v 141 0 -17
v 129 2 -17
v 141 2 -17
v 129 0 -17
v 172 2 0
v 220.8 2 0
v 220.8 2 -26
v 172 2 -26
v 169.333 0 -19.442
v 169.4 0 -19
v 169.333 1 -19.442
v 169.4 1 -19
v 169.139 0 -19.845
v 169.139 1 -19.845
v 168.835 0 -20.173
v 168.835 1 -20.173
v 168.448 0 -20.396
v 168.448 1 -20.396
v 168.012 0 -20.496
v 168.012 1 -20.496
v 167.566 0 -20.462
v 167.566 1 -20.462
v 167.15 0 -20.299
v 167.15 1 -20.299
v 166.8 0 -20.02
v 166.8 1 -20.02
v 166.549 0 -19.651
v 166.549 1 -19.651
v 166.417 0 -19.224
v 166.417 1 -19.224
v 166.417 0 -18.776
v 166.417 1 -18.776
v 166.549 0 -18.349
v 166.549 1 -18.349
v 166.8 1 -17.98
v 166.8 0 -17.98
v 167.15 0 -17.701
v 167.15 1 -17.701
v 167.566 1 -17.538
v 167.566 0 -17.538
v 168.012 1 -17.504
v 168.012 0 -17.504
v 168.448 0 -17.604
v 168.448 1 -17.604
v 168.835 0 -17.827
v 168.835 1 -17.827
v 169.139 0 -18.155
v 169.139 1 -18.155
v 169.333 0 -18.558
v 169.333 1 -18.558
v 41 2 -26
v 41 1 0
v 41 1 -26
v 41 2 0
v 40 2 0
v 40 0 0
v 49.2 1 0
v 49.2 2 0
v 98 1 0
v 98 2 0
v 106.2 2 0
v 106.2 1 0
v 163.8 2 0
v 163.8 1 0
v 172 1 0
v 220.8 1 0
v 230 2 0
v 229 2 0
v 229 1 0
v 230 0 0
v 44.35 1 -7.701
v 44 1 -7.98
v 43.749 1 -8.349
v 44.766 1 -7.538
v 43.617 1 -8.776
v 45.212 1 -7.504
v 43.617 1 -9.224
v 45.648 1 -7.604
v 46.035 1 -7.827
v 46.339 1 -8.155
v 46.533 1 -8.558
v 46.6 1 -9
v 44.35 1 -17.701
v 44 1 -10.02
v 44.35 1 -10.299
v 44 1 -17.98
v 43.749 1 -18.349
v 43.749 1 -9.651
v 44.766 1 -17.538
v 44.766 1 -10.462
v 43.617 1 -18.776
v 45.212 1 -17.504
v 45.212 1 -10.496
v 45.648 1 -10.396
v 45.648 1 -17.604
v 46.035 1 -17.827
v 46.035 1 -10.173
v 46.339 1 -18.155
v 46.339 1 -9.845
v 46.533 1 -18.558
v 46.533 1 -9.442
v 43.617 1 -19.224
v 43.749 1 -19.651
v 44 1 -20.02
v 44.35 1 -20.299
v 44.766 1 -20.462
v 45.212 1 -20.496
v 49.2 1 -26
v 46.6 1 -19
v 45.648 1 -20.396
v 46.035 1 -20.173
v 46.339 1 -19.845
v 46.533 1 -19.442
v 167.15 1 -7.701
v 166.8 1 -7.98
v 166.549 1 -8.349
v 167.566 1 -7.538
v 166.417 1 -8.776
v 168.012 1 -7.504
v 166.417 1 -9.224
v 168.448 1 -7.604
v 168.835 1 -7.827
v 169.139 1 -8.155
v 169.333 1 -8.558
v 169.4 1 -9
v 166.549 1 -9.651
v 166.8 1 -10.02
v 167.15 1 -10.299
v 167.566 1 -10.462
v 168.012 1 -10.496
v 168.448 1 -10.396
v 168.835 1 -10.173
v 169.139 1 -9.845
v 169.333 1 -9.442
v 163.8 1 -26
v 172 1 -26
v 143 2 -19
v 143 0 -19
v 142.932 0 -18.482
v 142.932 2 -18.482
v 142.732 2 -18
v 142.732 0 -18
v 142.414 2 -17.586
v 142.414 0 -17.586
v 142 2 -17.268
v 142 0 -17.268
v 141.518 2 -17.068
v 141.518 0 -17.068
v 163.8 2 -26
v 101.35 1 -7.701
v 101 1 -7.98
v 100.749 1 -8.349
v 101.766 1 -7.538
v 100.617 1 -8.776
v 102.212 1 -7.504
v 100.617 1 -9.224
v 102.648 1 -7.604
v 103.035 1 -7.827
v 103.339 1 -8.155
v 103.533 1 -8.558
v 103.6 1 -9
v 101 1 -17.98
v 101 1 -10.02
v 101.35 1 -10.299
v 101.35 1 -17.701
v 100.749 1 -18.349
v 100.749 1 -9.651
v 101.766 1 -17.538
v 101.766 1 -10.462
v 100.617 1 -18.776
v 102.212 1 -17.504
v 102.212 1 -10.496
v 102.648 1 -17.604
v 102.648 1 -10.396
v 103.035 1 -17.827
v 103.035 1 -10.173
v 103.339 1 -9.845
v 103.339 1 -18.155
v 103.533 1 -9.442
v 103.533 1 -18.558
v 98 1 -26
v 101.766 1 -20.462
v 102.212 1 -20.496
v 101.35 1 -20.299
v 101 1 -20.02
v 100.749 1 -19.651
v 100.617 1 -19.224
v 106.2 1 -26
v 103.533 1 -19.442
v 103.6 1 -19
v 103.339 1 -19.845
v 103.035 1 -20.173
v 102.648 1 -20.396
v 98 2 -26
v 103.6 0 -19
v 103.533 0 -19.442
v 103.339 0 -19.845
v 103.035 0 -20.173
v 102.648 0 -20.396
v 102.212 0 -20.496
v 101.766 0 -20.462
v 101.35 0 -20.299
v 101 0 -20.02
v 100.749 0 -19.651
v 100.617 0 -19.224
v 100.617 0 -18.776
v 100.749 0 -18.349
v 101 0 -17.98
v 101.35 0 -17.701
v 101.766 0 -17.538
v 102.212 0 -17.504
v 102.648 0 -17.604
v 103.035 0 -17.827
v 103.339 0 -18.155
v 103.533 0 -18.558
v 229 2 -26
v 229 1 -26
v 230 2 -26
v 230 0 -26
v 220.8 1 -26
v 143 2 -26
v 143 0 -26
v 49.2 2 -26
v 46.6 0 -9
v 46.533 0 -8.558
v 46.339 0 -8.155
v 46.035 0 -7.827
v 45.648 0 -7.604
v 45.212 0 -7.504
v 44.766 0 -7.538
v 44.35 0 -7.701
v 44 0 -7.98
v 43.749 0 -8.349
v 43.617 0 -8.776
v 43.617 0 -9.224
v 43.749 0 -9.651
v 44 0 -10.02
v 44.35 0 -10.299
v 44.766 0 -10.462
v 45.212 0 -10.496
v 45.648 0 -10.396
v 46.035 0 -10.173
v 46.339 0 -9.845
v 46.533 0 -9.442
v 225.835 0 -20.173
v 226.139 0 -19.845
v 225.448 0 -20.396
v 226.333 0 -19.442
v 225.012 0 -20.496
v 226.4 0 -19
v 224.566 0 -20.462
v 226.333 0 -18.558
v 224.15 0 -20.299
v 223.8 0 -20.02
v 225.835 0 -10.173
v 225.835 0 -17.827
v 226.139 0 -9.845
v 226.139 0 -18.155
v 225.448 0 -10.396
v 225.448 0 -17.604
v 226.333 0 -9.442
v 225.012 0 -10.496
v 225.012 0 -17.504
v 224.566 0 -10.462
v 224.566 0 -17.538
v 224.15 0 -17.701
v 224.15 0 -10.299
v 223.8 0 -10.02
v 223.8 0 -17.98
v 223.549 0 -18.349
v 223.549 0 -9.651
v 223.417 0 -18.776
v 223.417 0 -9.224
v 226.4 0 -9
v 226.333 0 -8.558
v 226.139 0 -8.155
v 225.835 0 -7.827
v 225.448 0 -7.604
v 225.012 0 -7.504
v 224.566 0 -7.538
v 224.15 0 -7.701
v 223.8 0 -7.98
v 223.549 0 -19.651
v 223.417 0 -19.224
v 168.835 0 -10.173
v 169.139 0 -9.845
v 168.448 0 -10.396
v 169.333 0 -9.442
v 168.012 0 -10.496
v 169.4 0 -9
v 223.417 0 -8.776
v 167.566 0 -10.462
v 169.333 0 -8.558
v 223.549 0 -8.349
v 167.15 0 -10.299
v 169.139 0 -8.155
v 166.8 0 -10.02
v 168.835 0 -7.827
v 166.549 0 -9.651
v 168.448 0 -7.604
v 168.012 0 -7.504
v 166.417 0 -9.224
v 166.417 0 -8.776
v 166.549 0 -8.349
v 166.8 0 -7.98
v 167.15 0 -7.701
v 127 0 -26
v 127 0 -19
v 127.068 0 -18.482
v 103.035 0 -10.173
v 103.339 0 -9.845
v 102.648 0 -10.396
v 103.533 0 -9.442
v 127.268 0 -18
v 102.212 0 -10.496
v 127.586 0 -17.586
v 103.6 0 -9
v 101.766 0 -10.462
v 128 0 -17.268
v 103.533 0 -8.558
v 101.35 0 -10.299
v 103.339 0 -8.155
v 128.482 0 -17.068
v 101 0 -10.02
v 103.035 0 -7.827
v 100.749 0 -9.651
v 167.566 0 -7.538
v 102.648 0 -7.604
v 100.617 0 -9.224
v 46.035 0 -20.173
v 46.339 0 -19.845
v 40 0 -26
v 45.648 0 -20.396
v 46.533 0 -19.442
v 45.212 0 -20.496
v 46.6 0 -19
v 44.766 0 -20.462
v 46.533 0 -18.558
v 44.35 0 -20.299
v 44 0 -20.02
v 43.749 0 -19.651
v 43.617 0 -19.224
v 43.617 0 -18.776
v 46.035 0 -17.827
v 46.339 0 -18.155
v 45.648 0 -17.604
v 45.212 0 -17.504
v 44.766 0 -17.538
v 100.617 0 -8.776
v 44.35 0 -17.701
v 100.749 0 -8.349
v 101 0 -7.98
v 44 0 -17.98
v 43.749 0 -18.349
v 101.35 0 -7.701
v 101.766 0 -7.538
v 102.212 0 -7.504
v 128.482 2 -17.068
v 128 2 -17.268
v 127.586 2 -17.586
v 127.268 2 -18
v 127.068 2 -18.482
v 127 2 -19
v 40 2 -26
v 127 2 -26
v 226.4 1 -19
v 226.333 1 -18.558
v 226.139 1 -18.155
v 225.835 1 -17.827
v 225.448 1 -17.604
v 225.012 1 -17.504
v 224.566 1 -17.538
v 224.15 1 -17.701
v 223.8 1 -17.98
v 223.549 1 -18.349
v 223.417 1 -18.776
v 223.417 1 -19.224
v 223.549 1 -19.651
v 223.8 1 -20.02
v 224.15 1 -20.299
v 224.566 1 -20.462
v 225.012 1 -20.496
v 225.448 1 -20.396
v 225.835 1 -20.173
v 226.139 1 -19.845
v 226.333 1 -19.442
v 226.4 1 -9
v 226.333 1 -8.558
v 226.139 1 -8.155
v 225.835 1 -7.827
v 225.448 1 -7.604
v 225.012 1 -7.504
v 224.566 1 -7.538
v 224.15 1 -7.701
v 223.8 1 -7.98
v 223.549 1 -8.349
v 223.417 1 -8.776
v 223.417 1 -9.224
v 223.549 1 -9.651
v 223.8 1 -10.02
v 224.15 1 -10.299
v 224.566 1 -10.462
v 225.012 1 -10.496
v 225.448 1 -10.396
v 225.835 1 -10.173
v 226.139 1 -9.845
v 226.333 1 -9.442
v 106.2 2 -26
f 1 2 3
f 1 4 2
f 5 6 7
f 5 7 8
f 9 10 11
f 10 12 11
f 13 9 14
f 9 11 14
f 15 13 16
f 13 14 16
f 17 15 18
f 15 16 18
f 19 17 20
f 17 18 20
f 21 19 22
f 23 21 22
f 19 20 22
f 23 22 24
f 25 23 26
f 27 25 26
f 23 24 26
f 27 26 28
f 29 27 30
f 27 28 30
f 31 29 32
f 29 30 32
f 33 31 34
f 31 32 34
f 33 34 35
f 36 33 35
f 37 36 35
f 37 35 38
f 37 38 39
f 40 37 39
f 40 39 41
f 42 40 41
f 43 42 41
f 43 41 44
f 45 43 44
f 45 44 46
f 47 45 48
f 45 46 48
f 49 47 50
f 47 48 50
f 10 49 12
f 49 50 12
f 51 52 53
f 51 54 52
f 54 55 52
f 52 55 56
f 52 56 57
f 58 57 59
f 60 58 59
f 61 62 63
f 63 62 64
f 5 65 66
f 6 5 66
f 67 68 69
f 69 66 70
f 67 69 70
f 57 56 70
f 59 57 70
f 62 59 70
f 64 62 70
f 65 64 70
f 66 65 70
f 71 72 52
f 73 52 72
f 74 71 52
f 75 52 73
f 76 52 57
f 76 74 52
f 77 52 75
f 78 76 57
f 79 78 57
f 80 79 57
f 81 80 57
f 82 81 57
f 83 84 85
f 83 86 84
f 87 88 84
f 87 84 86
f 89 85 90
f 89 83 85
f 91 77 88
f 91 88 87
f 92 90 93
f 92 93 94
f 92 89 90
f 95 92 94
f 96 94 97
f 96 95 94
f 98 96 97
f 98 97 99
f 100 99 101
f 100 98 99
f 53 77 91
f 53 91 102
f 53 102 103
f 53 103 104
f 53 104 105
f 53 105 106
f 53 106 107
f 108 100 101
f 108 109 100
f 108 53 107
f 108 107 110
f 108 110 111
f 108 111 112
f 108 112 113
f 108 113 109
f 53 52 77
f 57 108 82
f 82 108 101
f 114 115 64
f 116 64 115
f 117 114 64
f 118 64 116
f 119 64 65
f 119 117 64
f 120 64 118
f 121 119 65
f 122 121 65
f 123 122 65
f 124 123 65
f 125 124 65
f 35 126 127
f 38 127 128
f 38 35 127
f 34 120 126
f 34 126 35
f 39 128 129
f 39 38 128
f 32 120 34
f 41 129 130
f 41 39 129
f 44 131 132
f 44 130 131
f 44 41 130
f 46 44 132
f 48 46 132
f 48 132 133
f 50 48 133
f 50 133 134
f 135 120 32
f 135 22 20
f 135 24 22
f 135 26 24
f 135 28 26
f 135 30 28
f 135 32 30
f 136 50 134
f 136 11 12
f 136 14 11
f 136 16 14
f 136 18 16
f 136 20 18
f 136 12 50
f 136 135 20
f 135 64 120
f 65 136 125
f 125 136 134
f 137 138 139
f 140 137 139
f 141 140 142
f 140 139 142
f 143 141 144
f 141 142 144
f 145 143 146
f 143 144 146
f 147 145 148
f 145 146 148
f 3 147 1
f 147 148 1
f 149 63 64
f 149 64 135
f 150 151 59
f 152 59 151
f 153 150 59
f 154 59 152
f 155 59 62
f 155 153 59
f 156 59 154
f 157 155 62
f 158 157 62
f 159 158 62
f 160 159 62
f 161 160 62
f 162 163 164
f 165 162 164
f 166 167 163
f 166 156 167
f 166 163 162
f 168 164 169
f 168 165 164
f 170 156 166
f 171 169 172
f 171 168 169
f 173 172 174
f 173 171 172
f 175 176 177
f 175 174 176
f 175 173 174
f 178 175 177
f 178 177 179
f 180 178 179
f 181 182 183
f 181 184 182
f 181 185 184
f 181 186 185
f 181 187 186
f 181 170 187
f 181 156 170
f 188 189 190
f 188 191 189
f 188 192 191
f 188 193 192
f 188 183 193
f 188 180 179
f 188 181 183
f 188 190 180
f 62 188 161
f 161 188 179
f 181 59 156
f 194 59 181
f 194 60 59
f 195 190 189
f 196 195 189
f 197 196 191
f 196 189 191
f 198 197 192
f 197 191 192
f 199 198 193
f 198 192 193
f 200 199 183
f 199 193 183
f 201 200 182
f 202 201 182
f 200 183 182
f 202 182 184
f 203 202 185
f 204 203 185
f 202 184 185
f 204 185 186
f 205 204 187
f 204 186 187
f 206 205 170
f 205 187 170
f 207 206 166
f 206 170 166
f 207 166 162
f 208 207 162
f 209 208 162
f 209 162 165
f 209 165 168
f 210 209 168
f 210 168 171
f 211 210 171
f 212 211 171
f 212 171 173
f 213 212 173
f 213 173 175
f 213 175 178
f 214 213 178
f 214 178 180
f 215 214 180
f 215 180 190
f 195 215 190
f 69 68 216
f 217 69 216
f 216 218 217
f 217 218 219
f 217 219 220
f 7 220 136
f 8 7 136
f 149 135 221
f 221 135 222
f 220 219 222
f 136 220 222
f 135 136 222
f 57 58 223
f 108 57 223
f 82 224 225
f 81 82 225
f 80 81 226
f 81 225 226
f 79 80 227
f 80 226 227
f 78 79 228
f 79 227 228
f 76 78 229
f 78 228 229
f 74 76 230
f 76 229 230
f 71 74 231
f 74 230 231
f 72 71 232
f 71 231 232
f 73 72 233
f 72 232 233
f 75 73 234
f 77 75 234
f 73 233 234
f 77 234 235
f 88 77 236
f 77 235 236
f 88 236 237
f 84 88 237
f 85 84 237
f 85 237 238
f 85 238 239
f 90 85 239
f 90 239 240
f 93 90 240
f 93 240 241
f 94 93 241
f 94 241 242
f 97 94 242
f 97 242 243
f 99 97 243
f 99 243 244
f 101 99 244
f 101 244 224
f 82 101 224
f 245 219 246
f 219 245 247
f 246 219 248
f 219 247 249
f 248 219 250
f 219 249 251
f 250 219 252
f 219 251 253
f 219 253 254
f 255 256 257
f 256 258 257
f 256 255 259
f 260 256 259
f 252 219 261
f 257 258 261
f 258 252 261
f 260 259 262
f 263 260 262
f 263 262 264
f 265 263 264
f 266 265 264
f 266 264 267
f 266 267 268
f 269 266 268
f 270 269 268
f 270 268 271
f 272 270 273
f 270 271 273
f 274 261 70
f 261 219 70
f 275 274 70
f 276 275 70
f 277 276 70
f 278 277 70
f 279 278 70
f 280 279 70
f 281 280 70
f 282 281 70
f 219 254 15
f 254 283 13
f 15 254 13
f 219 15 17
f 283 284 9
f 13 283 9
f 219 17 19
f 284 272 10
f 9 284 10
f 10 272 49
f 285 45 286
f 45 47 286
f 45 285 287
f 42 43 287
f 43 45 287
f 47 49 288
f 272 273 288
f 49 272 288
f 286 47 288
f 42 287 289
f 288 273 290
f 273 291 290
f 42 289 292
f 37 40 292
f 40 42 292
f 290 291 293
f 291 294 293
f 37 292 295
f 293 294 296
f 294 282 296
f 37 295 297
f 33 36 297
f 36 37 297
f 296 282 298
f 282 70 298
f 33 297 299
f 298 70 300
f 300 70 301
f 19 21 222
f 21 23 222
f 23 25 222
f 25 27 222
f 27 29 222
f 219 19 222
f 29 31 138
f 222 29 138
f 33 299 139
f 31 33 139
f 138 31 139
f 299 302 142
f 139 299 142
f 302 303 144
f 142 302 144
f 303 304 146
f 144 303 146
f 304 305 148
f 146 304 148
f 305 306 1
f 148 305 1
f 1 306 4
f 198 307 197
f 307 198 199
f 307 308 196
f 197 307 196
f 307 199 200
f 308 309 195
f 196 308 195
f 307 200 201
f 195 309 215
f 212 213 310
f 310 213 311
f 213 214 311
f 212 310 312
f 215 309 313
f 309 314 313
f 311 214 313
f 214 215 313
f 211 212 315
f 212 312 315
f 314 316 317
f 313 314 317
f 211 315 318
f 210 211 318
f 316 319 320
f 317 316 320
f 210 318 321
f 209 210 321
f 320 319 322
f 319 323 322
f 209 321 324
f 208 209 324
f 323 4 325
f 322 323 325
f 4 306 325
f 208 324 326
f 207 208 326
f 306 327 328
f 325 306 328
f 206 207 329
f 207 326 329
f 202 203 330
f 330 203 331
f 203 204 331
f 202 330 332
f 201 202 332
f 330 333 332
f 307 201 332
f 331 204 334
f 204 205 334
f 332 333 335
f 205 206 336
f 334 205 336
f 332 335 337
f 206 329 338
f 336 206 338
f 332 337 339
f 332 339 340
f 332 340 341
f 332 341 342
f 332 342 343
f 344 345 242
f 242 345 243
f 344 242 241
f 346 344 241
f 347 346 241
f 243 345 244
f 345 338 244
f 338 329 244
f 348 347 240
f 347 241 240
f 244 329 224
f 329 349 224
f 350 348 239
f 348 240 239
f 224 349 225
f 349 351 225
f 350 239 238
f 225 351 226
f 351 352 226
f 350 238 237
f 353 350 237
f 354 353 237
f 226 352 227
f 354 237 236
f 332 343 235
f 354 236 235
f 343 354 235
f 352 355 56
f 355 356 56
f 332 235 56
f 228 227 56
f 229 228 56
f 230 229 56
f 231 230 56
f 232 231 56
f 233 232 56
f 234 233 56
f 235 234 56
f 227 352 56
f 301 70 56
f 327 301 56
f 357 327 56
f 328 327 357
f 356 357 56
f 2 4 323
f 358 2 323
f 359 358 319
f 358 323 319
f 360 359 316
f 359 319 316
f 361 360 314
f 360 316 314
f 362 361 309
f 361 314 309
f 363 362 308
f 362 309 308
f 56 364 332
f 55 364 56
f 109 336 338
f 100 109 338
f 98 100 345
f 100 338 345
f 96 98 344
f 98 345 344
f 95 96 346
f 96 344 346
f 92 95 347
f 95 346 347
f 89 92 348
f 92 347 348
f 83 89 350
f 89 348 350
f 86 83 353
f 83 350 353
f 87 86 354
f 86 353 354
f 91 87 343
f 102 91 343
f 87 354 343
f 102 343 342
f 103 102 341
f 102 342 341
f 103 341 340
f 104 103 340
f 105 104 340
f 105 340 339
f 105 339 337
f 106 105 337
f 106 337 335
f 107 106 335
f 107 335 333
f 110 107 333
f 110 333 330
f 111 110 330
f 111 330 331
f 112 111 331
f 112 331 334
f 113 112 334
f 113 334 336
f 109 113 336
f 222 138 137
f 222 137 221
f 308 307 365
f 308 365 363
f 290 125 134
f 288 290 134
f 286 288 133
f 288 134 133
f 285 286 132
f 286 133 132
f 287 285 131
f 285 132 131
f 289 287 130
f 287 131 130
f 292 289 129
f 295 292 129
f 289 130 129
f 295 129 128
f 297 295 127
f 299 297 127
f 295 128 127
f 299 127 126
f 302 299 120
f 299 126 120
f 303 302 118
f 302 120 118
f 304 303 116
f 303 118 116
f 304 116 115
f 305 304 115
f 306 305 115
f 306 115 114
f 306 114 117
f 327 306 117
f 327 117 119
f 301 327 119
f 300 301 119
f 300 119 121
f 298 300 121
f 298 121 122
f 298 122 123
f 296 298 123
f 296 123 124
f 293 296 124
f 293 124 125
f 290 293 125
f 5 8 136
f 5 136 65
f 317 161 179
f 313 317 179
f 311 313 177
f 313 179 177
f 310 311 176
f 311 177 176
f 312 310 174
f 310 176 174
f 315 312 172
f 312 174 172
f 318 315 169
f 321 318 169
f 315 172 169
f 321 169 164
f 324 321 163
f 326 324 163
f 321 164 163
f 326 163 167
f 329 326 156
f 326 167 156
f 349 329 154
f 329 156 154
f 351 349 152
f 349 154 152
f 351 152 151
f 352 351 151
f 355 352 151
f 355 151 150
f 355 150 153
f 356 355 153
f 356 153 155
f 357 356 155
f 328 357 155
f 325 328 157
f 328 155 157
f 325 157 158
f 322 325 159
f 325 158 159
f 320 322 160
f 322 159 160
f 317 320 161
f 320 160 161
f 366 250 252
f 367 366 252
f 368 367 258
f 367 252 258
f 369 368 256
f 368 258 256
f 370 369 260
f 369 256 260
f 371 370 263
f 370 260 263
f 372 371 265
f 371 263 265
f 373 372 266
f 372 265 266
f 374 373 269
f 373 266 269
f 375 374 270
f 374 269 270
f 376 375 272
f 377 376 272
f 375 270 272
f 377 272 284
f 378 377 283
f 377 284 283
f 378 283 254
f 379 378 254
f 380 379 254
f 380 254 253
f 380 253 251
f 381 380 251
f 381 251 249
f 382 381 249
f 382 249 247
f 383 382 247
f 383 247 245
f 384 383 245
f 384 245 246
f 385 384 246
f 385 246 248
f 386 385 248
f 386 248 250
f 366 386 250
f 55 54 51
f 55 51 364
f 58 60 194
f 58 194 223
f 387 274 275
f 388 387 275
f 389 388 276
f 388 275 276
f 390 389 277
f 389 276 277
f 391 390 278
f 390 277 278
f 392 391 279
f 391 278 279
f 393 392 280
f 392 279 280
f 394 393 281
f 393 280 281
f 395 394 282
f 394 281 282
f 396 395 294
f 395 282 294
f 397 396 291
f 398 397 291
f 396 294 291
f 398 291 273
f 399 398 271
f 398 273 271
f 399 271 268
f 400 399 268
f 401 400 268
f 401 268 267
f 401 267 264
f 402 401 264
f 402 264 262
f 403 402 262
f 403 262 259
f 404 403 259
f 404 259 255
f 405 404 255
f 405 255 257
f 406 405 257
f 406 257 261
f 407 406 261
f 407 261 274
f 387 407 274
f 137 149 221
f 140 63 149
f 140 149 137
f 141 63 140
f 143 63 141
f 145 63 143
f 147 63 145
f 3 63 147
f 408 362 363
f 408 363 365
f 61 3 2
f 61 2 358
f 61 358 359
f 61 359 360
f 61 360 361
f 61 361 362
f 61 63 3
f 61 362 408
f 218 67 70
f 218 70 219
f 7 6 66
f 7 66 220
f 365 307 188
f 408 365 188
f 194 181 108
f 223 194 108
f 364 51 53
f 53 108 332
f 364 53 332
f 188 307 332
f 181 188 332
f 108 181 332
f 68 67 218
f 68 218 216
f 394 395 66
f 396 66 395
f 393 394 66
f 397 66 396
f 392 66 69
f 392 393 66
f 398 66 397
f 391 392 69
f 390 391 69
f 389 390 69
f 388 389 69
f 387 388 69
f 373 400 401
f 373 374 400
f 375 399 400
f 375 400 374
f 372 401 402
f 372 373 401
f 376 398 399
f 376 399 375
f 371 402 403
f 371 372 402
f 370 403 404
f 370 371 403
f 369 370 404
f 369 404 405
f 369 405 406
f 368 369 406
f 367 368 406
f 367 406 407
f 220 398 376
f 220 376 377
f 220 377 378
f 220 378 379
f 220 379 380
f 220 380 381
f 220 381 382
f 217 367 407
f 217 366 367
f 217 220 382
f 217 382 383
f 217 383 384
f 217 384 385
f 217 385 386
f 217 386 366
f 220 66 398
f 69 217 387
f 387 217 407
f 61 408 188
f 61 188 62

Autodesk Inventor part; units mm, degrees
ref_plane "YZ Plane" through (0, 0, 0) normal (1, 0, 0) x (0, 1, 0)
ref_plane "XZ Plane" through (0, 0, 0) normal (0, 1, 0) x (-1, 0, 0)
ref_plane "XY Plane" through (0, 0, 0) normal (0, 0, 1) x (1, 0, 0)
sketch "스케치1" plane through (0, 0, 0) normal (0, 1, 0) x (-1, 0, 0)
  line L0 (0, 0) -> (-270, 0)
  line L1 (-270, 0) -> (-270, -26)
  line L2 (-270, -26) -> (0, -26)
  line L3 (0, -26) -> (0, 0)
  dimension "d0" = 270
  dimension "d1" = 26
extrude "돌출1" add sketch "스케치1" along normal blind 2
sketch "스케치2" plane through (0, 2, 0) normal (0, 1, 0) x (1, 0, 0)
  line L0 (0, 0) -> (270, 0) projected
  line L1 (270, 0) -> (270, 26) projected
  line L2 (270, 26) -> (0, 26) projected
  line L3 (0, 26) -> (0, 0) projected
  line L4 (1, 26) -> (1, 0)
  line L5 (9.2, 26) -> (9.2, 0)
  line L6 (269, 26) -> (269, 0)
  line L7 (260.8, 26) -> (260.8, 0)
  line L8 (0, 0) -> (270, 0) projected
  line L9 (270, 26) -> (0, 26) projected
  line L10 (260.8, 0) -> (269, 0)
  line L11 (260.8, 26) -> (269, 26)
  line L12 (0, 0) -> (40, 0)
  line L13 (40, 0) -> (41, 0)
  line L14 (41, 0) -> (41, 26)
  line L15 (41, 0) -> (49.2, 0)
  line L16 (49.2, 0) -> (49.2, 26)
  line L17 (270, 0) -> (270, 0)
  line L18 (270, 0) -> (229, 0)
  line L19 (229, 0) -> (220.8, 0)
  line L20 (220.8, 0) -> (220.8, 26)
  line L21 (229, 0) -> (229, 26)
  line L22 (229, 26) -> (220.8, 26)
  line L23 (41, 26) -> (49.2, 26)
  line L24 (9.2, 0) -> (1, 0)
  line L25 (9.2, 26) -> (1, 26)
  line L26 (1, 0) -> (1, 26)
  dimension "d19" = 8.2
  dimension "d20" = 1
  dimension "d21" = 8.2
  dimension "d22" = 40
  dimension "d23" = 1
  dimension "d24" = 8.2
  dimension "d26" = 8.2
  dimension "d29" = 41
extrude "돌출3" cut sketch "스케치2" against normal blind 1 contours L4 L2 L5 L0 | L14 L2 L16 L0 | L20 L2 L21 L0 | L7 L2 L6 L0
sketch "스케치5" plane through (0, 0, 0) normal (0, -1, 0) x (1, 0, 0)
  line L0 (0, 0) -> (270, 0) projected
  line L1 (0, -26) -> (0, 0) projected
  line L2 (270, -26) -> (0, -26) projected
  line L3 (270, 0) -> (270, -26) projected
  line L4 (0, 0) -> (270, 0) projected
  line L5 (270, -26) -> (0, -26) projected
  line L6 (127, -26) -> (127, -19)
  line L7 (129, -17) -> (141, -17)
  line L8 (143, -19) -> (143, -26)
  arc A0 (129, -17) -> (127, -19) centre (129, -19) ccw
  arc A1 (143, -19) -> (141, -17) centre (141, -19) ccw
  point P0 (127, -17)
  point P1 (143, -17)
  dimension "d39" = 9
  dimension "d40" = 16
  dimension "d70" = 127
  dimension "d71" = 2
  dimension "d72" = 2
sketch "스케치6" plane through (0, 0, 0) normal (0, -1, 0) x (1, 0, 0)
  line L0 (1, -26) -> (9.2, -26) projected
  line L1 (1, 0) -> (1, -26) projected
  line L2 (9.2, 0) -> (1, 0) projected
  line L3 (9.2, -26) -> (9.2, 0) projected
  line L4 (49.2, 0) -> (41, 0) projected
  line L5 (49.2, -26) -> (49.2, 0) projected
  line L6 (41, -26) -> (49.2, -26) projected
  line L7 (41, 0) -> (41, -26) projected
  line L8 (220.8, -26) -> (229, -26) projected
  line L9 (220.8, 0) -> (220.8, -26) projected
  line L10 (229, 0) -> (220.8, 0) projected
  line L11 (229, -26) -> (229, 0) projected
  line L12 (269, -26) -> (269, 0) projected
  line L13 (260.8, -26) -> (269, -26) projected
  line L14 (260.8, 0) -> (260.8, -26) projected
  line L15 (269, 0) -> (260.8, 0) projected
  circle A0 centre (5.1, -9) radius 1.5
  circle A1 centre (5.1, -19) radius 1.5
  circle A2 centre (45.1, -9) radius 1.5
  circle A3 centre (45.1, -19) radius 1.5
  circle A4 centre (224.9, -9) radius 1.5
  circle A5 centre (224.9, -19) radius 1.5
  circle A6 centre (264.9, -19) radius 1.5
  circle A7 centre (264.9, -9) radius 1.5
  point P0 (0, 0)
  dimension "d43" = 3
  dimension "d44" = 3
  dimension "d45" = 3
  dimension "d46" = 3
  dimension "d47" = 3
  dimension "d48" = 3
  dimension "d49" = 3
  dimension "d50" = 3
  dimension "d51" = 4.1
  dimension "d52" = 4.1
  dimension "d53" = 4.1
  dimension "d54" = 4.1
  dimension "d55" = 4.1
  dimension "d56" = 4.1
  dimension "d57" = 4.1
  dimension "d58" = 4.1
  dimension "d59" = 9
  dimension "d60" = 7
  dimension "d61" = 7
  dimension "d62" = 9
  dimension "d63" = 9
  dimension "d64" = 7
  dimension "d65" = 7
  dimension "d66" = 9
extrude "돌출6" cut sketch "스케치6" against normal blind 10 contours A0 | A1 | A2 | A3 | A4 | A5 | A6 | A7
extrude "돌출7" cut sketch "스케치5" against normal blind 2 contours L6 A0 L7 A1 L8 L2
sketch "스케치7" plane through (0, 2, 0) normal (0, 1, 0) x (1, 0, 0)
  line L0 (127, 19) -> (127, 26) projected
  line L1 (127, 26) -> (49.2, 26) projected
  line L2 (49.2, 26) -> (49.2, 0) projected
  line L3 (49.2, 0) -> (220.8, 0) projected
  line L4 (220.8, 0) -> (220.8, 26) projected
  line L5 (220.8, 26) -> (143, 26) projected
  line L6 (143, 26) -> (143, 19) projected
  arc A0 (141, 17) -> (143, 19) centre (141, 19) ccw projected
  line L7 (141, 17) -> (129, 17) projected
  arc A1 (127, 19) -> (129, 17) centre (129, 19) ccw projected
  line L8 (49.2, 0) -> (220.8, 0) projected
  line L9 (270, 26) -> (143, 26) projected
  line L10 (172, 0) -> (163.8, 0)
  line L11 (163.8, 0) -> (163.8, 26)
  line L12 (163.8, 26) -> (172, 26)
  line L13 (172, 26) -> (172, 0)
  line L14 (127, 26) -> (49.2, 26) projected
  line L15 (106.2, 0) -> (98, 0)
  line L16 (98, 0) -> (98, 26)
  line L17 (98, 26) -> (106.2, 26)
  line L18 (106.2, 26) -> (106.2, 0)
  line L19 (270, 0) -> (270, 26) projected
  line L20 (0, 26) -> (0, 0) projected
  dimension "d75" = 8.2
  dimension "d76" = 8.2
  dimension "d77" = 98
  dimension "d78" = 98
extrude "돌출8" cut sketch "스케치7" against normal blind 1 contours L18 L3 L16 L1 | L11 L5 L13 L3
sketch "스케치8" plane through (0, 1, 0) normal (0, 1, 0) x (1, 0, 0)
  circle A0 centre (167.9, 19) radius 1.5
  circle A1 centre (167.9, 9) radius 1.5
  circle A2 centre (102.1, 9) radius 1.5
  circle A3 centre (102.1, 19) radius 1.5
  line L0 (163.8, 26) -> (172, 26) projected
  line L1 (172, 26) -> (172, 0) projected
  line L2 (163.8, 0) -> (163.8, 26) projected
  line L3 (106.2, 26) -> (106.2, 0) projected
  line L4 (98, 0) -> (98, 26) projected
  line L5 (98, 26) -> (106.2, 26) projected
  point P0 (0, 0)
  dimension "d81" = 3
  dimension "d82" = 3
  dimension "d83" = 3
  dimension "d84" = 3
  dimension "d85" = 7
  dimension "d86" = 4.1
  dimension "d87" = 4.1
  dimension "d88" = 10
  dimension "d89" = 4.1
  dimension "d90" = 4.1
  dimension "d91" = 7
  dimension "d92" = 10
extrude "돌출9" cut sketch "스케치8" against normal blind 1
sketch "스케치9" plane through (0, 2, 0) normal (0, 1, 0) x (1, 0, 0)
  line L0 (230, 0) -> (230, 25)
  line L1 (40, 25) -> (40, 0)
  line L2 (270, 0) -> (270, 26) projected
  line L3 (230, 0) -> (270, 0)
  line L4 (270, 0) -> (270, 26)
  line L5 (270, 26) -> (230, 26)
  line L6 (230, 26) -> (230, 0)
  line L7 (40, 0) -> (0, 0)
  line L8 (0, 0) -> (0, 26)
  line L9 (0, 26) -> (40, 26)
  line L10 (40, 26) -> (40, 0)
extrude "돌출10" cut sketch "스케치9" against normal blind 10
properties part number "앞뒷판_중간" material "알루미늄 6061"
